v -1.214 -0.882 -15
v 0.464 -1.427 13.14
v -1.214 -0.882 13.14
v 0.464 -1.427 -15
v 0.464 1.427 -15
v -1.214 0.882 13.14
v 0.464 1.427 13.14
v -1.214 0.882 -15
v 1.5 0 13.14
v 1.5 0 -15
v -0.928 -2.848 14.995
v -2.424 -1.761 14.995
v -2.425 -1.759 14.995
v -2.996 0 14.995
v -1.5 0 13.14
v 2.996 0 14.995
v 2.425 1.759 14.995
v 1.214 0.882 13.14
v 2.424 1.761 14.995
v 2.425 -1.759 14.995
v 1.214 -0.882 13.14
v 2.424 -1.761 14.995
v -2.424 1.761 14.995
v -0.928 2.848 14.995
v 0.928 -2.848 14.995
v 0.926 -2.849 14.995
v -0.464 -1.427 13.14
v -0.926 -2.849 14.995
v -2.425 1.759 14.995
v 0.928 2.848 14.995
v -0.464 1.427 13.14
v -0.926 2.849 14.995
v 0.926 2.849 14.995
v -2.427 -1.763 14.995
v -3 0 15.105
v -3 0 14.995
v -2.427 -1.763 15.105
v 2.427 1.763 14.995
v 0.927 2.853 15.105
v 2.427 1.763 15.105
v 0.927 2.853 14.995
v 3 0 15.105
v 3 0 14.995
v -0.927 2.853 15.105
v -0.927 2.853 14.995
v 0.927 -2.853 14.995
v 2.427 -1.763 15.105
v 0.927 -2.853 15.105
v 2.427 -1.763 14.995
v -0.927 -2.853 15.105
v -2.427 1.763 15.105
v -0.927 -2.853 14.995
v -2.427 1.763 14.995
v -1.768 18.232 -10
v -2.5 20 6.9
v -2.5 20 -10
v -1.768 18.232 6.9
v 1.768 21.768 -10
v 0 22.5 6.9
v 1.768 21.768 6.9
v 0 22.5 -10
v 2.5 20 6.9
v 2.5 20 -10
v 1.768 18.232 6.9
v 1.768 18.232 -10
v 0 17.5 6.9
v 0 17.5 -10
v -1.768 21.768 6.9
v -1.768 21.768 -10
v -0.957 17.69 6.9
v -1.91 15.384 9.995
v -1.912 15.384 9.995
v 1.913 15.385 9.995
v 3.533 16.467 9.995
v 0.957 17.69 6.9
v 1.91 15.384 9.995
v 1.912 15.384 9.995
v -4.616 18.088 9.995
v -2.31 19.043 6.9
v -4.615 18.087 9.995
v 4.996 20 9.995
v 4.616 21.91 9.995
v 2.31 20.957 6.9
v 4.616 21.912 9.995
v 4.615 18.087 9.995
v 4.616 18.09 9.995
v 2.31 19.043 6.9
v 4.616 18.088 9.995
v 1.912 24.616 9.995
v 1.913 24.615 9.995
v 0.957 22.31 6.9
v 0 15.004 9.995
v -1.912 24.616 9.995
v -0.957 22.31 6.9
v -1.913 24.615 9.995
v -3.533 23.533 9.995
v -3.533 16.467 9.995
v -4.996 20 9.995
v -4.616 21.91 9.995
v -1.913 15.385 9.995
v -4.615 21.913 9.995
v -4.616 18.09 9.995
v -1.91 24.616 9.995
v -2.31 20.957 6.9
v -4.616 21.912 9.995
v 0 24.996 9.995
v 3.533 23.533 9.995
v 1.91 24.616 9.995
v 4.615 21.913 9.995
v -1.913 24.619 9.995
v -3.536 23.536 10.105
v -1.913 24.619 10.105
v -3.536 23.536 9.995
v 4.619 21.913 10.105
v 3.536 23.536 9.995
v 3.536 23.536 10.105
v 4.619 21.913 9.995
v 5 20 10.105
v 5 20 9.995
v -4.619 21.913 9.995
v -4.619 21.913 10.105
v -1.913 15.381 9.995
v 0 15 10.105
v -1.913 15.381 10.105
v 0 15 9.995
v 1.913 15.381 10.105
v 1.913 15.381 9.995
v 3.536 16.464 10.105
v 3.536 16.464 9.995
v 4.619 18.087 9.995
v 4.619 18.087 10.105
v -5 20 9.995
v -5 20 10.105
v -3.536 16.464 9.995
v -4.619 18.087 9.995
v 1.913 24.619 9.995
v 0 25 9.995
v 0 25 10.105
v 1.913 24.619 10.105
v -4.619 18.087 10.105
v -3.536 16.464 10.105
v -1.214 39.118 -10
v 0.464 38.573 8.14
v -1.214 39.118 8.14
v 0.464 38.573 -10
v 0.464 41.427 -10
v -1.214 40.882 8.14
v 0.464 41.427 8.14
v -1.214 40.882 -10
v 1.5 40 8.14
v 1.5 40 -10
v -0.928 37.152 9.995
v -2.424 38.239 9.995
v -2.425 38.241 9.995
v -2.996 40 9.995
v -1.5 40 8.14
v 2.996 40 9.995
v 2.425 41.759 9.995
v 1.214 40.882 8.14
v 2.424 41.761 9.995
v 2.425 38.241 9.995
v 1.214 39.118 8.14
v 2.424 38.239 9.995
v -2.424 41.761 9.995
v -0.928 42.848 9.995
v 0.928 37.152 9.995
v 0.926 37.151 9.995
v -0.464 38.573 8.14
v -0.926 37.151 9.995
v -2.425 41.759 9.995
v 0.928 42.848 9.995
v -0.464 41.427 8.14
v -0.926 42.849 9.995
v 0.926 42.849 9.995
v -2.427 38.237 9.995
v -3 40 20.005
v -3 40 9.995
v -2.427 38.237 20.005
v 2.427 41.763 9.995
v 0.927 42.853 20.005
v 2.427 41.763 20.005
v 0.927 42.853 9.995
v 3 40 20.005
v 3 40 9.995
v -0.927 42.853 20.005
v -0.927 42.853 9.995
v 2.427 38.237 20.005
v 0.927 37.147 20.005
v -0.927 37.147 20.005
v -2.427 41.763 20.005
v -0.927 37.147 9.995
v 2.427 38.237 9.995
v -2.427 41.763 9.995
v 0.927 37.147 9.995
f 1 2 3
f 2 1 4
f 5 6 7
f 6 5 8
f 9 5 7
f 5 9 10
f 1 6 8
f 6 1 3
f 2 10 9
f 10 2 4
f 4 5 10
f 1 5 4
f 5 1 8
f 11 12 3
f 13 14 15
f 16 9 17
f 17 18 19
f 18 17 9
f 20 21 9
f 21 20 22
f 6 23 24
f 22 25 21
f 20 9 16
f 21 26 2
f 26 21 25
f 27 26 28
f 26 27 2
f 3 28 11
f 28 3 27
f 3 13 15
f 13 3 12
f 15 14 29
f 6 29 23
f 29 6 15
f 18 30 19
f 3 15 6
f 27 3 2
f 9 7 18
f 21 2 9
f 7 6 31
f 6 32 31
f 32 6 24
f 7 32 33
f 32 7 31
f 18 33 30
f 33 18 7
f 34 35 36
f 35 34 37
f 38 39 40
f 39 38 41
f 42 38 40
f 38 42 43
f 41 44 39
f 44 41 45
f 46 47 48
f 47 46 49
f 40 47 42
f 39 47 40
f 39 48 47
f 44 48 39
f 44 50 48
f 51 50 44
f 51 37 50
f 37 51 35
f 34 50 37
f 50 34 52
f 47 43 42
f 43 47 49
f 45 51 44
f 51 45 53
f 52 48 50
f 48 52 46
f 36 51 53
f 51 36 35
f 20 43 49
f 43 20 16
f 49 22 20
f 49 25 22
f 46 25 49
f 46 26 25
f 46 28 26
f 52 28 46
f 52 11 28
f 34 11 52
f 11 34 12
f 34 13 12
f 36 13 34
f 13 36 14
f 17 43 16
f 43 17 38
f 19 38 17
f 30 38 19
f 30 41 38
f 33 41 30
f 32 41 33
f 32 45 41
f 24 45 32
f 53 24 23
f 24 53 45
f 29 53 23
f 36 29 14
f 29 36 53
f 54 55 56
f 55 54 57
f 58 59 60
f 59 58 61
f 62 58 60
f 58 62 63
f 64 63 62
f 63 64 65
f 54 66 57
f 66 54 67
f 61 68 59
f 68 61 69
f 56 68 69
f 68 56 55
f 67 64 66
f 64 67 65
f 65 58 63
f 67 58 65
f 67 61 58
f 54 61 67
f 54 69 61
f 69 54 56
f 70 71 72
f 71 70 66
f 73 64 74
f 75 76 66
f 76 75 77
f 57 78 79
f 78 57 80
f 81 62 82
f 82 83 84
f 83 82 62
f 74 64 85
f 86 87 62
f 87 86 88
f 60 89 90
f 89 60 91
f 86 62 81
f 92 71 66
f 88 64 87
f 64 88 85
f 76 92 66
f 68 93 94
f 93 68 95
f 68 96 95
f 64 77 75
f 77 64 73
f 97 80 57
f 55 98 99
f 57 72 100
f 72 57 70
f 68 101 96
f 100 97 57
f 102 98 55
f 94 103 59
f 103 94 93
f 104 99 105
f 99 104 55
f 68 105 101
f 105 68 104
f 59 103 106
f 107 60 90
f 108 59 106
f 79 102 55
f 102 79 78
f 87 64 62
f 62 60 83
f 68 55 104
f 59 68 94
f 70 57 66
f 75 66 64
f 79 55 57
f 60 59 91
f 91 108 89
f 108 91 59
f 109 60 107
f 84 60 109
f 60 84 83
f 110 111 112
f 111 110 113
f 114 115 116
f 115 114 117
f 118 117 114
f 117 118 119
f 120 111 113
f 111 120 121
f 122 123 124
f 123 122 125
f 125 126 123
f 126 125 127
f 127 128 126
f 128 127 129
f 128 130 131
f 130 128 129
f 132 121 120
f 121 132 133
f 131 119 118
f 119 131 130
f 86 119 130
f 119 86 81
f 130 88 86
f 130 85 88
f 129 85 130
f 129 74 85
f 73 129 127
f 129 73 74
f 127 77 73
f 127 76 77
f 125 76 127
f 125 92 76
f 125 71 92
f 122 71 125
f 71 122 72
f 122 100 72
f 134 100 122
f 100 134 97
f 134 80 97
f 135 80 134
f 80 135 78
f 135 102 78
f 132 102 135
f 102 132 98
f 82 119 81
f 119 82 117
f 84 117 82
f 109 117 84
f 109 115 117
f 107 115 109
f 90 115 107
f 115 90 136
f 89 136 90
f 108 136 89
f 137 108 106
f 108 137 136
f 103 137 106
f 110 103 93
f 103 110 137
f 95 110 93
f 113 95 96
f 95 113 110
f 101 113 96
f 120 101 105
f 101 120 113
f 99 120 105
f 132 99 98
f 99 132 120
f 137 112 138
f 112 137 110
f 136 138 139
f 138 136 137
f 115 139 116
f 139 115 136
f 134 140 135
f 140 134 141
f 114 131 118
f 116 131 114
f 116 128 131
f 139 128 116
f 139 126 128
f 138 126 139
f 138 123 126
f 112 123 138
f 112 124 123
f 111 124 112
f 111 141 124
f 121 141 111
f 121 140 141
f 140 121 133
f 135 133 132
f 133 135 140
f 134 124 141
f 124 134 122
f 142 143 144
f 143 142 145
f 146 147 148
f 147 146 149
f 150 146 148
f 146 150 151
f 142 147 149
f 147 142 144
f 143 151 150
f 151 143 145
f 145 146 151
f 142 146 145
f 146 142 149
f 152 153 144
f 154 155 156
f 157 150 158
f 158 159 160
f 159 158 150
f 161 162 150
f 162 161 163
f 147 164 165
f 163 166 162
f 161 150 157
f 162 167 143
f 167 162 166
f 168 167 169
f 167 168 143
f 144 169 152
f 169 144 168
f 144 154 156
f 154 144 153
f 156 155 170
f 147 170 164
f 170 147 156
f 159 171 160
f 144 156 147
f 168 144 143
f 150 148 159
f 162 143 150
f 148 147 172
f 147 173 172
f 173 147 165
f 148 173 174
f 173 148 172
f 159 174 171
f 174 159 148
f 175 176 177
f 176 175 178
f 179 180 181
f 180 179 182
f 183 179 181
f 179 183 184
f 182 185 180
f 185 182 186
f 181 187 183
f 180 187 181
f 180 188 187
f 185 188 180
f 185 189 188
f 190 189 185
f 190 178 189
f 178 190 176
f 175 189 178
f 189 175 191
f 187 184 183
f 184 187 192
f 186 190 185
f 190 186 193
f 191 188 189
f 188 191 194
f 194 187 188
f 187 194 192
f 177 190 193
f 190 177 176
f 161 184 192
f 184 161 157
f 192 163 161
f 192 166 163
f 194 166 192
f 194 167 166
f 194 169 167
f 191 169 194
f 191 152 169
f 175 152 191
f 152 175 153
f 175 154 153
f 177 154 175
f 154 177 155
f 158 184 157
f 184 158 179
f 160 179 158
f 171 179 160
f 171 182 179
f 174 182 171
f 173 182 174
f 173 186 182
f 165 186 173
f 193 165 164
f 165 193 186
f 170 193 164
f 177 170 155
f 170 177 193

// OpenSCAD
module selfTappingScrew(mSize=3, length=30, recessCap=0.1){
dk = mSize*2;
d = mSize;
    k = (1.86/3)*mSize;
    color("lightblue"){
        // Shaft
        cylinder(d=d, h=length, center=true);
        // Cap
        translate([0,0,(length-k)/2])
            cylinder(d2=dk,d1=d, h=k, center=true);
    }
    
    // Recess
    color("lightblue",0.2){
        if(recessCap){
            translate([0,0,(length+recessCap)/2])
                cylinder(d=dk,h=recessCap+0.01, center=true);
        }
    }
}

translate([0,0,0])selfTappingScrew(mSize=3, length=30);
translate([0,20,0])selfTappingScrew(mSize=5, length=20);
translate([0,40,0])selfTappingScrew(mSize=3, length=20, recessCap=10);
